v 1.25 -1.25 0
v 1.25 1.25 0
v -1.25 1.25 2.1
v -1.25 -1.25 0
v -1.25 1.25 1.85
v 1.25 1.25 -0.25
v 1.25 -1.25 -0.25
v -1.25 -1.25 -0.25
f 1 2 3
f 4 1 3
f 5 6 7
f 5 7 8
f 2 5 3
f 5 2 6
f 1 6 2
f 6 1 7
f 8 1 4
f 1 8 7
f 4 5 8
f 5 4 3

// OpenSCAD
// file: lib/lodge_kit.scad
// Lodge shell tile kit — shared dimensions and modules.
//
// The game paints a lodge footprint in 5 m cells and resolves the
// exterior from these tiles at half-cell (2.5 m) resolution; see
// internal/world/lodge_shell.go. Every tile is authored in the same
// canonical frame:
//
//   * origin on the lodge floor plane (Z = 0);
//   * wall-type tiles sit on a footprint edge, centred on it, with the
//     OUTSIDE toward SCAD −Y (game +Z) and the wall thickness toward +Y;
//   * roof tiles are centred on a half-cell, with Z = 0 at the tile's
//     lowest corner; slopes fall toward −Y (game +Z);
//   * corner tiles sit on a grid vertex; an outer corner's building is
//     in the SCAD (−X, +Y) quadrant, an inner corner's notch in (+X, −Y).
//
// Colours are near-neutral: the renderer tints walls and roofs per lodge
// from a seeded palette (world.ShellPalette).
//
// Keep these in sync with the constants in lodge_shell.go.

tile   = 2.5;   // ShellTileSize
wall_h = 5.0;   // ShellWallHeight
rise   = 2.1;   // ShellRoofRise, per tile of run
pitch  = rise / tile;

wall_t   = 0.35;  // wall thickness
sink     = 1.5;   // walls run this far below the floor to hide pad grading
roof_t   = 0.25;  // roof slab thickness
overhang = 0.7;   // eaves overhang past the wall plane

c_wall   = [0.92, 0.90, 0.86];
c_stone  = [0.62, 0.61, 0.60];
c_trim   = [0.97, 0.97, 0.95];
c_glass  = [0.30, 0.42, 0.52];
c_door   = [0.36, 0.25, 0.18];
c_roof   = [0.97, 0.97, 0.97];
c_fascia = [0.55, 0.52, 0.50];

// Plain wall panel: timber above a stone plinth, a trim band under the
// eaves.
module wall_panel() {
    color(c_wall)
        translate([-tile/2, 0, -sink]) cube([tile, wall_t, wall_h + sink]);
    color(c_stone)
        translate([-tile/2, -0.06, -sink]) cube([tile, wall_t, sink + 0.7]);
    color(c_trim)
        translate([-tile/2, -0.04, wall_h - 0.3]) cube([tile, 0.1, 0.3]);
    battens();
}

// Horizontal board lines above the plinth.
module battens() {
    color(c_wall * 0.8)
        for (z = [1.3 : 0.6 : wall_h - 0.6])
            translate([-tile/2, -0.03, z]) cube([tile, 0.04, 0.06]);
}

// A framed pane on the outer face. x0/w along the wall, z0/h up it.
module pane(x0, w, z0, h) {
    color(c_trim)
        translate([x0 - 0.1, -0.05, z0 - 0.1]) cube([w + 0.2, 0.06, h + 0.2]);
    color(c_glass)
        translate([x0, -0.08, z0]) cube([w, 0.06, h]);
}

module wall_window() {
    wall_panel();
    pane(-0.7, 1.4, 1.4, 2.2);
    color(c_trim) translate([-0.02, -0.1, 1.4]) cube([0.04, 0.04, 2.2]); // mullion
}

// Tall window flanked by shutters.
module wall_window_alt() {
    wall_panel();
    pane(-0.5, 1.0, 1.2, 2.8);
    color(c_door) {
        translate([-1.0, -0.1, 1.2]) cube([0.4, 0.05, 2.8]);
        translate([ 0.6, -0.1, 1.2]) cube([0.4, 0.05, 2.8]);
    }
}

// Floor-to-eave glazing for food courts: a low stone sill, then glass in
// three lights.
module wall_glazed() {
    color(c_wall)
        translate([-tile/2, 0, -sink]) cube([tile, wall_t, wall_h + sink]);
    color(c_stone)
        translate([-tile/2, -0.06, -sink]) cube([tile, wall_t, sink + 0.35]);
    color(c_glass)
        translate([-tile/2, -0.09, 0.35]) cube([tile, 0.06, wall_h - 0.75]);
    color(c_trim) {
        for (x = [-tile/2, -tile/6, tile/6, tile/2 - 0.08])
            translate([x, -0.12, 0.35]) cube([0.08, 0.06, wall_h - 0.75]);
        translate([-tile/2, -0.12, wall_h - 0.45]) cube([tile, 0.07, 0.1]);
    }
}

// Glazed entry door under a small canopy, with a step.
module door() {
    color(c_wall)
        translate([-tile/2, 0, -sink]) cube([tile, wall_t, wall_h + sink]);
    color(c_stone)
        translate([-tile/2, -0.06, -sink]) cube([tile, wall_t, sink + 0.15]);
    battens();
    color(c_door)
        translate([-0.9, -0.1, 0]) cube([1.8, 0.1, 2.7]);
    color(c_glass) {
        translate([-0.75, -0.13, 0.9]) cube([0.65, 0.05, 1.6]);
        translate([ 0.10, -0.13, 0.9]) cube([0.65, 0.05, 1.6]);
    }
    color(c_trim)
        translate([-tile/2, -0.04, wall_h - 0.3]) cube([tile, 0.1, 0.3]);
    color(c_roof)   // canopy
        translate([-1.2, -1.3, 3.0])
            rotate([-12, 0, 0]) cube([2.4, 1.3, 0.12]);
    color(c_stone)  // step
        translate([-1.1, -0.9, -0.3]) cube([2.2, 0.9, 0.42]);
}

module corner_outer() {
    color(c_stone)
        translate([-0.3, -0.05, -sink]) cube([0.35, 0.35, wall_h + sink - 0.3]);
}

module corner_inner() {
    color(c_trim)
        translate([0, -0.12, 0]) cube([0.12, 0.12, wall_h - 0.3]);
}

// Roof slab over one half-cell. h lists corner heights (in rise units)
// in SCAD order (−X,+Y), (+X,+Y), (+X,−Y), (−X,−Y); split names which
// diagonal the top surface folds along: 0 through corners 0–2, 1
// through corners 1–3.
module roof_tile(h, split) {
    p = [[-tile/2, tile/2], [tile/2, tile/2], [tile/2, -tile/2], [-tile/2, -tile/2]];
    top = [for (i = [0:3]) [p[i][0], p[i][1], h[i] * rise]];
    bot = [for (i = [0:3]) [p[i][0], p[i][1], h[i] * rise - roof_t]];
    tris = split == 0 ? [[0, 1, 2], [0, 2, 3]] : [[0, 1, 3], [1, 2, 3]];
    color(c_roof)
        polyhedron(
            points = concat(top, bot),
            faces = concat(
                // top (clockwise seen from above = outward in OpenSCAD)
                [for (t = tris) [t[0], t[1], t[2]]],
                [for (t = tris) [t[2] + 4, t[1] + 4, t[0] + 4]],
                [for (i = [0:3]) [i, i + 4, (i + 1) % 4 + 4, (i + 1) % 4]]
            ));
}

// Eaves strip past a wall edge: continues the roof plane outward and
// down, finished with a fascia board.
module eave() {
    drop = overhang * pitch;
    color(c_roof)
        polyhedron(
            points = [
                [-tile/2, 0, 0], [tile/2, 0, 0], [tile/2, -overhang, -drop], [-tile/2, -overhang, -drop],
                [-tile/2, 0, -roof_t], [tile/2, 0, -roof_t], [tile/2, -overhang, -drop - roof_t], [-tile/2, -overhang, -drop - roof_t],
            ],
            faces = [[0, 1, 2, 3], [7, 6, 5, 4], [0, 4, 5, 1], [1, 5, 6, 2], [2, 6, 7, 3], [3, 7, 4, 0]]);
    color(c_fascia)
        translate([-tile/2, -overhang - 0.05, -drop - roof_t - 0.1]) cube([tile, 0.08, roof_t + 0.2]);
}

// Eaves in the square past an outer corner: a hip folding along the
// diagonal away from the building.
module eave_corner() {
    o = overhang;
    d = o * pitch;
    color(c_roof)
        polyhedron(
            points = [
                [0, 0, 0], [o, 0, -d], [o, -o, -d], [0, -o, -d],
                [0, 0, -roof_t], [o, 0, -d - roof_t], [o, -o, -d - roof_t], [0, -o, -d - roof_t],
            ],
            faces = [[0, 1, 2], [0, 2, 3], [6, 5, 4], [7, 6, 4], [0, 4, 5, 1], [1, 5, 6, 2], [2, 6, 7, 3], [3, 7, 4, 0]]);
    color(c_fascia) {
        translate([0, -o - 0.05, -d - roof_t - 0.1]) cube([o + 0.05, 0.08, roof_t + 0.2]);
        translate([o - 0.03, -o - 0.05, -d - roof_t - 0.1]) cube([0.08, o + 0.05, roof_t + 0.2]);
    }
}

module chimney() {
    color(c_stone)
        translate([-0.55, -0.55, -1.0]) cube([1.1, 1.1, rise + 3.0]);
    color(c_fascia)
        translate([-0.65, -0.65, rise + 1.8]) cube([1.3, 1.3, 0.2]);
}
// main file
// Lodge shell kit: hip, peaking at the (−X, +Y) corner. See lib/lodge_kit.scad.
include <lib/lodge_kit.scad>
roof_tile([1, 0, 0, 0], 0);
